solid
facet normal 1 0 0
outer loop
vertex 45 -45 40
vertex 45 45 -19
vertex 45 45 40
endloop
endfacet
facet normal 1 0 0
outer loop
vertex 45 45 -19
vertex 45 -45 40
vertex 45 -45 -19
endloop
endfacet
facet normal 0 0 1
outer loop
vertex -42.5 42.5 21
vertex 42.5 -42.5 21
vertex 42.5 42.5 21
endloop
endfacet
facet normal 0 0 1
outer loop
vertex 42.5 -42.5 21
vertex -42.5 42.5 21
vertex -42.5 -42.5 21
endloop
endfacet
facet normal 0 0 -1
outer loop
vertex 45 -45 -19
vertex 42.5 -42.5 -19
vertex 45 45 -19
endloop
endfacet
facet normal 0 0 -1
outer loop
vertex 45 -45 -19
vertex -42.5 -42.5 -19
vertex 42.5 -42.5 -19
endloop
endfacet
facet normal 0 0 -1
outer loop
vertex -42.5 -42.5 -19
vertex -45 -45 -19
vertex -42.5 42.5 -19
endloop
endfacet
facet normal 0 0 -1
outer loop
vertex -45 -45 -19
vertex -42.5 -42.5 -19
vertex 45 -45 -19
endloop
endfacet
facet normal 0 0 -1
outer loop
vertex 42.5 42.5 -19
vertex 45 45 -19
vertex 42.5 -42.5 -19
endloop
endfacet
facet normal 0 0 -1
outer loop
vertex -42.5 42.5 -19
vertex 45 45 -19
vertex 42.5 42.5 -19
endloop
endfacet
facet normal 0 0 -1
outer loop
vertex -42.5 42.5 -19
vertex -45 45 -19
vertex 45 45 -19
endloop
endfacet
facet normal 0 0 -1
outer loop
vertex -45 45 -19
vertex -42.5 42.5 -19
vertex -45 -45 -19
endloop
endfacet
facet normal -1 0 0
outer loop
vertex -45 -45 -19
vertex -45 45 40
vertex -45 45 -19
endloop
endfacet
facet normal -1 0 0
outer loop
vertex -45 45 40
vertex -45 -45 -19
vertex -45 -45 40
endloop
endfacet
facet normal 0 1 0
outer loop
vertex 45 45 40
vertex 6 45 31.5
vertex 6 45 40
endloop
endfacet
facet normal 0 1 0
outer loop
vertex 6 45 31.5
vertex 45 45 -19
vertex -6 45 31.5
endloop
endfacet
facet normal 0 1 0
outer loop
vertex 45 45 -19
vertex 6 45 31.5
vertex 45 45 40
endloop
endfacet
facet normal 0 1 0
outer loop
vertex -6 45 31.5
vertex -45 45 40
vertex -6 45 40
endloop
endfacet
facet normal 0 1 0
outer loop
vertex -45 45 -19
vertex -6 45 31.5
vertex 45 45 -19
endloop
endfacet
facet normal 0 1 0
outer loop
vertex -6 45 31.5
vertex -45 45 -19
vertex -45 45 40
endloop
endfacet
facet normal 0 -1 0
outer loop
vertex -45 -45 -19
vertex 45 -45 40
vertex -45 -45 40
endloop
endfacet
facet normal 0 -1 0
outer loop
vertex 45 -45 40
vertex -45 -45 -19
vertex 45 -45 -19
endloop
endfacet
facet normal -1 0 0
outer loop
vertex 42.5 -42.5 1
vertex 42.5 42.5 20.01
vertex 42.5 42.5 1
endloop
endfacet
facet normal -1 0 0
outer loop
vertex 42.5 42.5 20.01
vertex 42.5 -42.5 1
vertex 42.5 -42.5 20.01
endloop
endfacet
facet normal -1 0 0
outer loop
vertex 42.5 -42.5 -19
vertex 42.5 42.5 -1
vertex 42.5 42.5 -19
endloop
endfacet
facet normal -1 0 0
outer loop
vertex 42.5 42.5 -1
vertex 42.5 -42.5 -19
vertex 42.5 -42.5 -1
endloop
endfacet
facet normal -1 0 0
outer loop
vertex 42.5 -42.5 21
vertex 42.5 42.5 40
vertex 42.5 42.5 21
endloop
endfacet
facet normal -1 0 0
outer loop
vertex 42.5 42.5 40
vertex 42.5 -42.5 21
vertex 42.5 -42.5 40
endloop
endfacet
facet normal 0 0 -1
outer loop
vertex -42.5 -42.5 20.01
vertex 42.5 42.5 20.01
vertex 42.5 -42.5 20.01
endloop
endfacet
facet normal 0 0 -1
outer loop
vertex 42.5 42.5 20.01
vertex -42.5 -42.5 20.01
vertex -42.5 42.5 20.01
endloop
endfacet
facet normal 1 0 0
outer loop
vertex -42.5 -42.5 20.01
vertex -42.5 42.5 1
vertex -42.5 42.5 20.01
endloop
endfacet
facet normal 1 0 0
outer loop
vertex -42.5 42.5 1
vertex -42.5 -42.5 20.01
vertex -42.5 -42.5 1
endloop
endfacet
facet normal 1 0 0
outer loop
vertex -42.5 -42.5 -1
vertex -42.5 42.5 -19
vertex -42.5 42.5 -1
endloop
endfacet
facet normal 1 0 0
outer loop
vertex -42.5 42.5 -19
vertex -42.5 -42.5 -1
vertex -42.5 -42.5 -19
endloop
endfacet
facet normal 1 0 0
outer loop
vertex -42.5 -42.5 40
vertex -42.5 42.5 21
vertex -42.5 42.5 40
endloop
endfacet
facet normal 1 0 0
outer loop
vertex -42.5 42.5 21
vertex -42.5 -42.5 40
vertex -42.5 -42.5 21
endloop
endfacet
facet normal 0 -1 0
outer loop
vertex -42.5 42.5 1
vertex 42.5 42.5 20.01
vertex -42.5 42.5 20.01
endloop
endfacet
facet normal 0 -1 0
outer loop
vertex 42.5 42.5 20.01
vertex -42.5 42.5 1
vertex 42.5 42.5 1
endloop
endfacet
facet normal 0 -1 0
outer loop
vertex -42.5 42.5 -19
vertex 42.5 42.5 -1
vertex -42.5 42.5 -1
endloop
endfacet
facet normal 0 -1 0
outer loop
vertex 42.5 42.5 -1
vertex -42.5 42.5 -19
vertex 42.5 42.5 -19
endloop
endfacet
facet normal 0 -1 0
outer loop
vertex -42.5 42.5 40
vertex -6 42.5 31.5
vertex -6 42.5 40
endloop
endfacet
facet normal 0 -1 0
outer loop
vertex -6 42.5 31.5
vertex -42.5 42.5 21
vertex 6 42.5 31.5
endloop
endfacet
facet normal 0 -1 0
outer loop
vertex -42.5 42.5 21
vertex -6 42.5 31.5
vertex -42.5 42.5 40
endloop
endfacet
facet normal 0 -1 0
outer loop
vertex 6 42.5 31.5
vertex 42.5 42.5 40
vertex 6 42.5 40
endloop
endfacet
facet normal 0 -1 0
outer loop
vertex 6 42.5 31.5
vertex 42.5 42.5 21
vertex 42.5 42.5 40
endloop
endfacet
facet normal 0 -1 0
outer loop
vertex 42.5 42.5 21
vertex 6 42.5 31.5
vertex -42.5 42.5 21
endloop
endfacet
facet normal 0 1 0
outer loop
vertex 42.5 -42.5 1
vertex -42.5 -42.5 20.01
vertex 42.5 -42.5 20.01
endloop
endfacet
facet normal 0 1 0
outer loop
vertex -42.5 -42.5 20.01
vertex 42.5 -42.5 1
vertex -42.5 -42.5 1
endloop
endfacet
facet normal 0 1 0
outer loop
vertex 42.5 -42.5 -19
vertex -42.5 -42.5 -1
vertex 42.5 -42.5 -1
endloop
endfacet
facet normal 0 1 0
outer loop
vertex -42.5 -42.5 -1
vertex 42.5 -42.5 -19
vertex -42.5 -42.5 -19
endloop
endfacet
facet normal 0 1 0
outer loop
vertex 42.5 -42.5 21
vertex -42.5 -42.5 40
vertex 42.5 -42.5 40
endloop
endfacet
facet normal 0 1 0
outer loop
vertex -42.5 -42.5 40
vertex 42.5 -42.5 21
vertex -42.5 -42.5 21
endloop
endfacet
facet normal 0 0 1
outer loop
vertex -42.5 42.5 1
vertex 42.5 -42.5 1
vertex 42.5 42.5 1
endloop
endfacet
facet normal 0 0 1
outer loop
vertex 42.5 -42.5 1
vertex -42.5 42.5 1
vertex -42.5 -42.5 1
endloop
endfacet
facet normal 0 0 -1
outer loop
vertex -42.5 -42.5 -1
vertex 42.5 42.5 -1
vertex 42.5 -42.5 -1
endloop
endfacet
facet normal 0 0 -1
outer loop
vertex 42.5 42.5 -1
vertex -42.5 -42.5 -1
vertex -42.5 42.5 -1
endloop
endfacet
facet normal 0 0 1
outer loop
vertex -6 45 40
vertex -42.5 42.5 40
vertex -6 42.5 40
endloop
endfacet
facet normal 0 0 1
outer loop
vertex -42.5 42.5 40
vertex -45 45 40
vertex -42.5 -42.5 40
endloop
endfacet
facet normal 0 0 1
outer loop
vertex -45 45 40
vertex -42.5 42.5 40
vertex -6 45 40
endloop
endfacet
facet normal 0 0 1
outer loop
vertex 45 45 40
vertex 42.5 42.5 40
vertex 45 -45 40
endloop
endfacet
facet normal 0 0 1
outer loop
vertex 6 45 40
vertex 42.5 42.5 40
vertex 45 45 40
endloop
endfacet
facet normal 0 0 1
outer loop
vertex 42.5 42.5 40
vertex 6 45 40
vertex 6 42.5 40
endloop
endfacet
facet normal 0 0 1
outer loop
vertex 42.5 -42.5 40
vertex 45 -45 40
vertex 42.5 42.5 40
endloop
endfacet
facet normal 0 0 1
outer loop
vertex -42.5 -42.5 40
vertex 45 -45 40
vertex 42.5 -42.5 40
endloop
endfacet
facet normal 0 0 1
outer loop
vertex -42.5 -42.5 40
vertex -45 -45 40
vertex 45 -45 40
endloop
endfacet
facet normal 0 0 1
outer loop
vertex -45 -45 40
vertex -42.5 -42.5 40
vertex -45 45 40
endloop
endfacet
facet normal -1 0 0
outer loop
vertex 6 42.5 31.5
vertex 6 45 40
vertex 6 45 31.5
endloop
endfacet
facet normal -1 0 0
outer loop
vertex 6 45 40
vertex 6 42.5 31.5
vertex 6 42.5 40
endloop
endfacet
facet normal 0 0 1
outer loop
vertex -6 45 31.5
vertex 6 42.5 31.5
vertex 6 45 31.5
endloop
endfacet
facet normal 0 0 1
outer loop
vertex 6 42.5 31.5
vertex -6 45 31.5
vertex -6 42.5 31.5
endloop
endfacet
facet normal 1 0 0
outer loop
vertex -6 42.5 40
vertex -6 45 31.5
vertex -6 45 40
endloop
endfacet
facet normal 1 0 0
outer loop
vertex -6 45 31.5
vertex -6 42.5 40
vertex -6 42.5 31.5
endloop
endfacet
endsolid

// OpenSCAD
// DIY Magnetic Stirrer Housing
// Designed for an 80mm PC fan.
// Orientation: Printed upside-down (top plate on bed at z=0).

// --- Dimensions ---
outer_size = 90.0;      // Outer width and length (mm)
top_thick   = 2.0;      // Thickness of the top plate (mm)
wall_thick  = 2.5;      // Thickness of the side walls (mm)
total_height = 40.0;    // Total height from top plate to open edge (mm)
hole_dia    = 4.5;      // Diameter for M4 screw holes (mm)
hole_pattern = 71.5;    // Square pattern for fan mounting holes (mm)
notch_w     = 12.0;     // Width of the cable notch (mm)
notch_h     = 8.0;      // Depth of the notch from the open edge (mm)

$fn = 64;

// --- Geometry ---

// The main body of the housing
union() {
    // The top plate (sits on Z=0 to Z=top_thick)
    // Since it's printed upside down, the "top" is at Z=0.
    cube([outer_size, outer_size, top_thick], center = true);
    
    // The four walls
    // We use a hull or a subtraction method to create the walls.
    // Here, we build a solid block and subtract the interior.
    difference() {
        // The outer shell (walls + top plate)
        // We start from Z=0 (the plate) and go up to total_height.
        // Note: Since the plate is centered at Z=0, it spans -top_thick/2 to +top_thick/2.
        // To make the plate sit on the bed, we translate the whole assembly.
        
        translate([0, 0, top_thick/2]) {
            difference() {
                // Outer volume
                cube([outer_size, outer_size, total_height], center = true);
                
                // Inner volume (the hollow part)
                // We subtract a slightly smaller cube to create the walls.
                // The walls are 2.5mm thick.
                inner_dim = outer_size - (2 * wall_thick);
                // We subtract from Z=top_thick to total_height to keep the plate solid
                translate([0, 0, -top_thick/2 + 0.01]) 
                    cube([inner_dim, inner_dim, total_height], center = true);
            }
        }
    }
}

// --- Subtractions (Holes and Notches) ---

difference() {
    // We wrap the whole thing in a difference to cut the holes and notch
    // But since the code above is a union, we must structure the logic carefully.
    // Let's redefine the assembly to be a single difference block.
}

// RE-STRUCTURED MODEL FOR CLEAN DIFFERENCE
// 1. Create the solid block (Outer dimensions)
// 2. Subtract the inner cavity
// 3. Subtract the screw holes
// 4. Subtract the cable notch

module housing_assembly() {
    difference() {
        // The solid outer shell
        union() {
            // The top plate (on bed)
            translate([0, 0, top_thick/2])
                cube([outer_size, outer_size, top_thick], center = true);
            
            // The walls
            translate([0, 0, top_thick + (total_height - top_thick)/2])
                cube([outer_size, outer_size, total_height - top_thick], center = true);
        }

        // --- Subtractions ---

        // 1. The inner hollow cavity
        // It starts from the top plate and goes to the top edge.
        translate([0, 0, top_thick + (total_height - top_thick)/2])
            cube([outer_size - 2*wall_thick, outer_size - 2*wall_thick, total_height], center = true);

        // 2. The four screw holes
        for (sx = [-1, 1], sy = [-1, 1]) {
            translate([sx * hole_pattern/2, sy * hole_pattern/2, -1])
                cylinder(h = top_thick + 2, d = hole_dia);
        }

        // 3. The cable notch
        // Located in one wall, centered along the wall (X or Y axis).
        // Let's pick the wall at Y = outer_size/2.
        // Notch is 12mm wide, 8mm deep from the open edge.
        // Open edge is at Z = total_height.
        // Notch reaches from Z = total_height - 8 to Z = total_height.
        translate([0, outer_size/2 - wall_thick/2, total_height - notch_h/2])
            cube([notch_w, wall_thick + 1, notch_h + 0.1], center = true);
    }
}

// Final Render
// We use a simple translate to ensure the plate is at Z=0.
// The logic above is a bit messy for a single difference, 
// so let's provide the clean, final version below.

// --- FINAL CLEAN VERSION ---

difference() {
    // Outer Shape
    union() {
        // Top Plate
        translate([0, 0, top_thick/2])
            cube([outer_size, outer_size, top_thick], center = true);
        // Walls
        translate([0, 0, top_thick + (total_height - top_thick)/2])
            cube([outer_size, outer_size, total_height - top_thick], center = true);
    }

    // Hollow Interior
    translate([0, 0, top_thick + (total_height - top_thick)/2])
        cube([outer_size - 2*wall_thick, outer_size - 2*wall_thick, total_height], center = true);

    // Screw Holes
    for (sx = [-1, 1], sy = [-1, 1]) {
        translate([sx * hole_pattern/2, sy * hole_pattern/2, -1])
            cylinder(h = top_thick + 2, d = hole_dia);
    }

    // Cable Notch (on the wall at Y = outer_size/2)
    // Centered on X, at the edge of the wall.
    translate([0, outer_size/2 - wall_thick/2, total_height - notch_h/2])
        cube([notch_w, wall_thick + 2, notch_h + 1], center = true);
}
